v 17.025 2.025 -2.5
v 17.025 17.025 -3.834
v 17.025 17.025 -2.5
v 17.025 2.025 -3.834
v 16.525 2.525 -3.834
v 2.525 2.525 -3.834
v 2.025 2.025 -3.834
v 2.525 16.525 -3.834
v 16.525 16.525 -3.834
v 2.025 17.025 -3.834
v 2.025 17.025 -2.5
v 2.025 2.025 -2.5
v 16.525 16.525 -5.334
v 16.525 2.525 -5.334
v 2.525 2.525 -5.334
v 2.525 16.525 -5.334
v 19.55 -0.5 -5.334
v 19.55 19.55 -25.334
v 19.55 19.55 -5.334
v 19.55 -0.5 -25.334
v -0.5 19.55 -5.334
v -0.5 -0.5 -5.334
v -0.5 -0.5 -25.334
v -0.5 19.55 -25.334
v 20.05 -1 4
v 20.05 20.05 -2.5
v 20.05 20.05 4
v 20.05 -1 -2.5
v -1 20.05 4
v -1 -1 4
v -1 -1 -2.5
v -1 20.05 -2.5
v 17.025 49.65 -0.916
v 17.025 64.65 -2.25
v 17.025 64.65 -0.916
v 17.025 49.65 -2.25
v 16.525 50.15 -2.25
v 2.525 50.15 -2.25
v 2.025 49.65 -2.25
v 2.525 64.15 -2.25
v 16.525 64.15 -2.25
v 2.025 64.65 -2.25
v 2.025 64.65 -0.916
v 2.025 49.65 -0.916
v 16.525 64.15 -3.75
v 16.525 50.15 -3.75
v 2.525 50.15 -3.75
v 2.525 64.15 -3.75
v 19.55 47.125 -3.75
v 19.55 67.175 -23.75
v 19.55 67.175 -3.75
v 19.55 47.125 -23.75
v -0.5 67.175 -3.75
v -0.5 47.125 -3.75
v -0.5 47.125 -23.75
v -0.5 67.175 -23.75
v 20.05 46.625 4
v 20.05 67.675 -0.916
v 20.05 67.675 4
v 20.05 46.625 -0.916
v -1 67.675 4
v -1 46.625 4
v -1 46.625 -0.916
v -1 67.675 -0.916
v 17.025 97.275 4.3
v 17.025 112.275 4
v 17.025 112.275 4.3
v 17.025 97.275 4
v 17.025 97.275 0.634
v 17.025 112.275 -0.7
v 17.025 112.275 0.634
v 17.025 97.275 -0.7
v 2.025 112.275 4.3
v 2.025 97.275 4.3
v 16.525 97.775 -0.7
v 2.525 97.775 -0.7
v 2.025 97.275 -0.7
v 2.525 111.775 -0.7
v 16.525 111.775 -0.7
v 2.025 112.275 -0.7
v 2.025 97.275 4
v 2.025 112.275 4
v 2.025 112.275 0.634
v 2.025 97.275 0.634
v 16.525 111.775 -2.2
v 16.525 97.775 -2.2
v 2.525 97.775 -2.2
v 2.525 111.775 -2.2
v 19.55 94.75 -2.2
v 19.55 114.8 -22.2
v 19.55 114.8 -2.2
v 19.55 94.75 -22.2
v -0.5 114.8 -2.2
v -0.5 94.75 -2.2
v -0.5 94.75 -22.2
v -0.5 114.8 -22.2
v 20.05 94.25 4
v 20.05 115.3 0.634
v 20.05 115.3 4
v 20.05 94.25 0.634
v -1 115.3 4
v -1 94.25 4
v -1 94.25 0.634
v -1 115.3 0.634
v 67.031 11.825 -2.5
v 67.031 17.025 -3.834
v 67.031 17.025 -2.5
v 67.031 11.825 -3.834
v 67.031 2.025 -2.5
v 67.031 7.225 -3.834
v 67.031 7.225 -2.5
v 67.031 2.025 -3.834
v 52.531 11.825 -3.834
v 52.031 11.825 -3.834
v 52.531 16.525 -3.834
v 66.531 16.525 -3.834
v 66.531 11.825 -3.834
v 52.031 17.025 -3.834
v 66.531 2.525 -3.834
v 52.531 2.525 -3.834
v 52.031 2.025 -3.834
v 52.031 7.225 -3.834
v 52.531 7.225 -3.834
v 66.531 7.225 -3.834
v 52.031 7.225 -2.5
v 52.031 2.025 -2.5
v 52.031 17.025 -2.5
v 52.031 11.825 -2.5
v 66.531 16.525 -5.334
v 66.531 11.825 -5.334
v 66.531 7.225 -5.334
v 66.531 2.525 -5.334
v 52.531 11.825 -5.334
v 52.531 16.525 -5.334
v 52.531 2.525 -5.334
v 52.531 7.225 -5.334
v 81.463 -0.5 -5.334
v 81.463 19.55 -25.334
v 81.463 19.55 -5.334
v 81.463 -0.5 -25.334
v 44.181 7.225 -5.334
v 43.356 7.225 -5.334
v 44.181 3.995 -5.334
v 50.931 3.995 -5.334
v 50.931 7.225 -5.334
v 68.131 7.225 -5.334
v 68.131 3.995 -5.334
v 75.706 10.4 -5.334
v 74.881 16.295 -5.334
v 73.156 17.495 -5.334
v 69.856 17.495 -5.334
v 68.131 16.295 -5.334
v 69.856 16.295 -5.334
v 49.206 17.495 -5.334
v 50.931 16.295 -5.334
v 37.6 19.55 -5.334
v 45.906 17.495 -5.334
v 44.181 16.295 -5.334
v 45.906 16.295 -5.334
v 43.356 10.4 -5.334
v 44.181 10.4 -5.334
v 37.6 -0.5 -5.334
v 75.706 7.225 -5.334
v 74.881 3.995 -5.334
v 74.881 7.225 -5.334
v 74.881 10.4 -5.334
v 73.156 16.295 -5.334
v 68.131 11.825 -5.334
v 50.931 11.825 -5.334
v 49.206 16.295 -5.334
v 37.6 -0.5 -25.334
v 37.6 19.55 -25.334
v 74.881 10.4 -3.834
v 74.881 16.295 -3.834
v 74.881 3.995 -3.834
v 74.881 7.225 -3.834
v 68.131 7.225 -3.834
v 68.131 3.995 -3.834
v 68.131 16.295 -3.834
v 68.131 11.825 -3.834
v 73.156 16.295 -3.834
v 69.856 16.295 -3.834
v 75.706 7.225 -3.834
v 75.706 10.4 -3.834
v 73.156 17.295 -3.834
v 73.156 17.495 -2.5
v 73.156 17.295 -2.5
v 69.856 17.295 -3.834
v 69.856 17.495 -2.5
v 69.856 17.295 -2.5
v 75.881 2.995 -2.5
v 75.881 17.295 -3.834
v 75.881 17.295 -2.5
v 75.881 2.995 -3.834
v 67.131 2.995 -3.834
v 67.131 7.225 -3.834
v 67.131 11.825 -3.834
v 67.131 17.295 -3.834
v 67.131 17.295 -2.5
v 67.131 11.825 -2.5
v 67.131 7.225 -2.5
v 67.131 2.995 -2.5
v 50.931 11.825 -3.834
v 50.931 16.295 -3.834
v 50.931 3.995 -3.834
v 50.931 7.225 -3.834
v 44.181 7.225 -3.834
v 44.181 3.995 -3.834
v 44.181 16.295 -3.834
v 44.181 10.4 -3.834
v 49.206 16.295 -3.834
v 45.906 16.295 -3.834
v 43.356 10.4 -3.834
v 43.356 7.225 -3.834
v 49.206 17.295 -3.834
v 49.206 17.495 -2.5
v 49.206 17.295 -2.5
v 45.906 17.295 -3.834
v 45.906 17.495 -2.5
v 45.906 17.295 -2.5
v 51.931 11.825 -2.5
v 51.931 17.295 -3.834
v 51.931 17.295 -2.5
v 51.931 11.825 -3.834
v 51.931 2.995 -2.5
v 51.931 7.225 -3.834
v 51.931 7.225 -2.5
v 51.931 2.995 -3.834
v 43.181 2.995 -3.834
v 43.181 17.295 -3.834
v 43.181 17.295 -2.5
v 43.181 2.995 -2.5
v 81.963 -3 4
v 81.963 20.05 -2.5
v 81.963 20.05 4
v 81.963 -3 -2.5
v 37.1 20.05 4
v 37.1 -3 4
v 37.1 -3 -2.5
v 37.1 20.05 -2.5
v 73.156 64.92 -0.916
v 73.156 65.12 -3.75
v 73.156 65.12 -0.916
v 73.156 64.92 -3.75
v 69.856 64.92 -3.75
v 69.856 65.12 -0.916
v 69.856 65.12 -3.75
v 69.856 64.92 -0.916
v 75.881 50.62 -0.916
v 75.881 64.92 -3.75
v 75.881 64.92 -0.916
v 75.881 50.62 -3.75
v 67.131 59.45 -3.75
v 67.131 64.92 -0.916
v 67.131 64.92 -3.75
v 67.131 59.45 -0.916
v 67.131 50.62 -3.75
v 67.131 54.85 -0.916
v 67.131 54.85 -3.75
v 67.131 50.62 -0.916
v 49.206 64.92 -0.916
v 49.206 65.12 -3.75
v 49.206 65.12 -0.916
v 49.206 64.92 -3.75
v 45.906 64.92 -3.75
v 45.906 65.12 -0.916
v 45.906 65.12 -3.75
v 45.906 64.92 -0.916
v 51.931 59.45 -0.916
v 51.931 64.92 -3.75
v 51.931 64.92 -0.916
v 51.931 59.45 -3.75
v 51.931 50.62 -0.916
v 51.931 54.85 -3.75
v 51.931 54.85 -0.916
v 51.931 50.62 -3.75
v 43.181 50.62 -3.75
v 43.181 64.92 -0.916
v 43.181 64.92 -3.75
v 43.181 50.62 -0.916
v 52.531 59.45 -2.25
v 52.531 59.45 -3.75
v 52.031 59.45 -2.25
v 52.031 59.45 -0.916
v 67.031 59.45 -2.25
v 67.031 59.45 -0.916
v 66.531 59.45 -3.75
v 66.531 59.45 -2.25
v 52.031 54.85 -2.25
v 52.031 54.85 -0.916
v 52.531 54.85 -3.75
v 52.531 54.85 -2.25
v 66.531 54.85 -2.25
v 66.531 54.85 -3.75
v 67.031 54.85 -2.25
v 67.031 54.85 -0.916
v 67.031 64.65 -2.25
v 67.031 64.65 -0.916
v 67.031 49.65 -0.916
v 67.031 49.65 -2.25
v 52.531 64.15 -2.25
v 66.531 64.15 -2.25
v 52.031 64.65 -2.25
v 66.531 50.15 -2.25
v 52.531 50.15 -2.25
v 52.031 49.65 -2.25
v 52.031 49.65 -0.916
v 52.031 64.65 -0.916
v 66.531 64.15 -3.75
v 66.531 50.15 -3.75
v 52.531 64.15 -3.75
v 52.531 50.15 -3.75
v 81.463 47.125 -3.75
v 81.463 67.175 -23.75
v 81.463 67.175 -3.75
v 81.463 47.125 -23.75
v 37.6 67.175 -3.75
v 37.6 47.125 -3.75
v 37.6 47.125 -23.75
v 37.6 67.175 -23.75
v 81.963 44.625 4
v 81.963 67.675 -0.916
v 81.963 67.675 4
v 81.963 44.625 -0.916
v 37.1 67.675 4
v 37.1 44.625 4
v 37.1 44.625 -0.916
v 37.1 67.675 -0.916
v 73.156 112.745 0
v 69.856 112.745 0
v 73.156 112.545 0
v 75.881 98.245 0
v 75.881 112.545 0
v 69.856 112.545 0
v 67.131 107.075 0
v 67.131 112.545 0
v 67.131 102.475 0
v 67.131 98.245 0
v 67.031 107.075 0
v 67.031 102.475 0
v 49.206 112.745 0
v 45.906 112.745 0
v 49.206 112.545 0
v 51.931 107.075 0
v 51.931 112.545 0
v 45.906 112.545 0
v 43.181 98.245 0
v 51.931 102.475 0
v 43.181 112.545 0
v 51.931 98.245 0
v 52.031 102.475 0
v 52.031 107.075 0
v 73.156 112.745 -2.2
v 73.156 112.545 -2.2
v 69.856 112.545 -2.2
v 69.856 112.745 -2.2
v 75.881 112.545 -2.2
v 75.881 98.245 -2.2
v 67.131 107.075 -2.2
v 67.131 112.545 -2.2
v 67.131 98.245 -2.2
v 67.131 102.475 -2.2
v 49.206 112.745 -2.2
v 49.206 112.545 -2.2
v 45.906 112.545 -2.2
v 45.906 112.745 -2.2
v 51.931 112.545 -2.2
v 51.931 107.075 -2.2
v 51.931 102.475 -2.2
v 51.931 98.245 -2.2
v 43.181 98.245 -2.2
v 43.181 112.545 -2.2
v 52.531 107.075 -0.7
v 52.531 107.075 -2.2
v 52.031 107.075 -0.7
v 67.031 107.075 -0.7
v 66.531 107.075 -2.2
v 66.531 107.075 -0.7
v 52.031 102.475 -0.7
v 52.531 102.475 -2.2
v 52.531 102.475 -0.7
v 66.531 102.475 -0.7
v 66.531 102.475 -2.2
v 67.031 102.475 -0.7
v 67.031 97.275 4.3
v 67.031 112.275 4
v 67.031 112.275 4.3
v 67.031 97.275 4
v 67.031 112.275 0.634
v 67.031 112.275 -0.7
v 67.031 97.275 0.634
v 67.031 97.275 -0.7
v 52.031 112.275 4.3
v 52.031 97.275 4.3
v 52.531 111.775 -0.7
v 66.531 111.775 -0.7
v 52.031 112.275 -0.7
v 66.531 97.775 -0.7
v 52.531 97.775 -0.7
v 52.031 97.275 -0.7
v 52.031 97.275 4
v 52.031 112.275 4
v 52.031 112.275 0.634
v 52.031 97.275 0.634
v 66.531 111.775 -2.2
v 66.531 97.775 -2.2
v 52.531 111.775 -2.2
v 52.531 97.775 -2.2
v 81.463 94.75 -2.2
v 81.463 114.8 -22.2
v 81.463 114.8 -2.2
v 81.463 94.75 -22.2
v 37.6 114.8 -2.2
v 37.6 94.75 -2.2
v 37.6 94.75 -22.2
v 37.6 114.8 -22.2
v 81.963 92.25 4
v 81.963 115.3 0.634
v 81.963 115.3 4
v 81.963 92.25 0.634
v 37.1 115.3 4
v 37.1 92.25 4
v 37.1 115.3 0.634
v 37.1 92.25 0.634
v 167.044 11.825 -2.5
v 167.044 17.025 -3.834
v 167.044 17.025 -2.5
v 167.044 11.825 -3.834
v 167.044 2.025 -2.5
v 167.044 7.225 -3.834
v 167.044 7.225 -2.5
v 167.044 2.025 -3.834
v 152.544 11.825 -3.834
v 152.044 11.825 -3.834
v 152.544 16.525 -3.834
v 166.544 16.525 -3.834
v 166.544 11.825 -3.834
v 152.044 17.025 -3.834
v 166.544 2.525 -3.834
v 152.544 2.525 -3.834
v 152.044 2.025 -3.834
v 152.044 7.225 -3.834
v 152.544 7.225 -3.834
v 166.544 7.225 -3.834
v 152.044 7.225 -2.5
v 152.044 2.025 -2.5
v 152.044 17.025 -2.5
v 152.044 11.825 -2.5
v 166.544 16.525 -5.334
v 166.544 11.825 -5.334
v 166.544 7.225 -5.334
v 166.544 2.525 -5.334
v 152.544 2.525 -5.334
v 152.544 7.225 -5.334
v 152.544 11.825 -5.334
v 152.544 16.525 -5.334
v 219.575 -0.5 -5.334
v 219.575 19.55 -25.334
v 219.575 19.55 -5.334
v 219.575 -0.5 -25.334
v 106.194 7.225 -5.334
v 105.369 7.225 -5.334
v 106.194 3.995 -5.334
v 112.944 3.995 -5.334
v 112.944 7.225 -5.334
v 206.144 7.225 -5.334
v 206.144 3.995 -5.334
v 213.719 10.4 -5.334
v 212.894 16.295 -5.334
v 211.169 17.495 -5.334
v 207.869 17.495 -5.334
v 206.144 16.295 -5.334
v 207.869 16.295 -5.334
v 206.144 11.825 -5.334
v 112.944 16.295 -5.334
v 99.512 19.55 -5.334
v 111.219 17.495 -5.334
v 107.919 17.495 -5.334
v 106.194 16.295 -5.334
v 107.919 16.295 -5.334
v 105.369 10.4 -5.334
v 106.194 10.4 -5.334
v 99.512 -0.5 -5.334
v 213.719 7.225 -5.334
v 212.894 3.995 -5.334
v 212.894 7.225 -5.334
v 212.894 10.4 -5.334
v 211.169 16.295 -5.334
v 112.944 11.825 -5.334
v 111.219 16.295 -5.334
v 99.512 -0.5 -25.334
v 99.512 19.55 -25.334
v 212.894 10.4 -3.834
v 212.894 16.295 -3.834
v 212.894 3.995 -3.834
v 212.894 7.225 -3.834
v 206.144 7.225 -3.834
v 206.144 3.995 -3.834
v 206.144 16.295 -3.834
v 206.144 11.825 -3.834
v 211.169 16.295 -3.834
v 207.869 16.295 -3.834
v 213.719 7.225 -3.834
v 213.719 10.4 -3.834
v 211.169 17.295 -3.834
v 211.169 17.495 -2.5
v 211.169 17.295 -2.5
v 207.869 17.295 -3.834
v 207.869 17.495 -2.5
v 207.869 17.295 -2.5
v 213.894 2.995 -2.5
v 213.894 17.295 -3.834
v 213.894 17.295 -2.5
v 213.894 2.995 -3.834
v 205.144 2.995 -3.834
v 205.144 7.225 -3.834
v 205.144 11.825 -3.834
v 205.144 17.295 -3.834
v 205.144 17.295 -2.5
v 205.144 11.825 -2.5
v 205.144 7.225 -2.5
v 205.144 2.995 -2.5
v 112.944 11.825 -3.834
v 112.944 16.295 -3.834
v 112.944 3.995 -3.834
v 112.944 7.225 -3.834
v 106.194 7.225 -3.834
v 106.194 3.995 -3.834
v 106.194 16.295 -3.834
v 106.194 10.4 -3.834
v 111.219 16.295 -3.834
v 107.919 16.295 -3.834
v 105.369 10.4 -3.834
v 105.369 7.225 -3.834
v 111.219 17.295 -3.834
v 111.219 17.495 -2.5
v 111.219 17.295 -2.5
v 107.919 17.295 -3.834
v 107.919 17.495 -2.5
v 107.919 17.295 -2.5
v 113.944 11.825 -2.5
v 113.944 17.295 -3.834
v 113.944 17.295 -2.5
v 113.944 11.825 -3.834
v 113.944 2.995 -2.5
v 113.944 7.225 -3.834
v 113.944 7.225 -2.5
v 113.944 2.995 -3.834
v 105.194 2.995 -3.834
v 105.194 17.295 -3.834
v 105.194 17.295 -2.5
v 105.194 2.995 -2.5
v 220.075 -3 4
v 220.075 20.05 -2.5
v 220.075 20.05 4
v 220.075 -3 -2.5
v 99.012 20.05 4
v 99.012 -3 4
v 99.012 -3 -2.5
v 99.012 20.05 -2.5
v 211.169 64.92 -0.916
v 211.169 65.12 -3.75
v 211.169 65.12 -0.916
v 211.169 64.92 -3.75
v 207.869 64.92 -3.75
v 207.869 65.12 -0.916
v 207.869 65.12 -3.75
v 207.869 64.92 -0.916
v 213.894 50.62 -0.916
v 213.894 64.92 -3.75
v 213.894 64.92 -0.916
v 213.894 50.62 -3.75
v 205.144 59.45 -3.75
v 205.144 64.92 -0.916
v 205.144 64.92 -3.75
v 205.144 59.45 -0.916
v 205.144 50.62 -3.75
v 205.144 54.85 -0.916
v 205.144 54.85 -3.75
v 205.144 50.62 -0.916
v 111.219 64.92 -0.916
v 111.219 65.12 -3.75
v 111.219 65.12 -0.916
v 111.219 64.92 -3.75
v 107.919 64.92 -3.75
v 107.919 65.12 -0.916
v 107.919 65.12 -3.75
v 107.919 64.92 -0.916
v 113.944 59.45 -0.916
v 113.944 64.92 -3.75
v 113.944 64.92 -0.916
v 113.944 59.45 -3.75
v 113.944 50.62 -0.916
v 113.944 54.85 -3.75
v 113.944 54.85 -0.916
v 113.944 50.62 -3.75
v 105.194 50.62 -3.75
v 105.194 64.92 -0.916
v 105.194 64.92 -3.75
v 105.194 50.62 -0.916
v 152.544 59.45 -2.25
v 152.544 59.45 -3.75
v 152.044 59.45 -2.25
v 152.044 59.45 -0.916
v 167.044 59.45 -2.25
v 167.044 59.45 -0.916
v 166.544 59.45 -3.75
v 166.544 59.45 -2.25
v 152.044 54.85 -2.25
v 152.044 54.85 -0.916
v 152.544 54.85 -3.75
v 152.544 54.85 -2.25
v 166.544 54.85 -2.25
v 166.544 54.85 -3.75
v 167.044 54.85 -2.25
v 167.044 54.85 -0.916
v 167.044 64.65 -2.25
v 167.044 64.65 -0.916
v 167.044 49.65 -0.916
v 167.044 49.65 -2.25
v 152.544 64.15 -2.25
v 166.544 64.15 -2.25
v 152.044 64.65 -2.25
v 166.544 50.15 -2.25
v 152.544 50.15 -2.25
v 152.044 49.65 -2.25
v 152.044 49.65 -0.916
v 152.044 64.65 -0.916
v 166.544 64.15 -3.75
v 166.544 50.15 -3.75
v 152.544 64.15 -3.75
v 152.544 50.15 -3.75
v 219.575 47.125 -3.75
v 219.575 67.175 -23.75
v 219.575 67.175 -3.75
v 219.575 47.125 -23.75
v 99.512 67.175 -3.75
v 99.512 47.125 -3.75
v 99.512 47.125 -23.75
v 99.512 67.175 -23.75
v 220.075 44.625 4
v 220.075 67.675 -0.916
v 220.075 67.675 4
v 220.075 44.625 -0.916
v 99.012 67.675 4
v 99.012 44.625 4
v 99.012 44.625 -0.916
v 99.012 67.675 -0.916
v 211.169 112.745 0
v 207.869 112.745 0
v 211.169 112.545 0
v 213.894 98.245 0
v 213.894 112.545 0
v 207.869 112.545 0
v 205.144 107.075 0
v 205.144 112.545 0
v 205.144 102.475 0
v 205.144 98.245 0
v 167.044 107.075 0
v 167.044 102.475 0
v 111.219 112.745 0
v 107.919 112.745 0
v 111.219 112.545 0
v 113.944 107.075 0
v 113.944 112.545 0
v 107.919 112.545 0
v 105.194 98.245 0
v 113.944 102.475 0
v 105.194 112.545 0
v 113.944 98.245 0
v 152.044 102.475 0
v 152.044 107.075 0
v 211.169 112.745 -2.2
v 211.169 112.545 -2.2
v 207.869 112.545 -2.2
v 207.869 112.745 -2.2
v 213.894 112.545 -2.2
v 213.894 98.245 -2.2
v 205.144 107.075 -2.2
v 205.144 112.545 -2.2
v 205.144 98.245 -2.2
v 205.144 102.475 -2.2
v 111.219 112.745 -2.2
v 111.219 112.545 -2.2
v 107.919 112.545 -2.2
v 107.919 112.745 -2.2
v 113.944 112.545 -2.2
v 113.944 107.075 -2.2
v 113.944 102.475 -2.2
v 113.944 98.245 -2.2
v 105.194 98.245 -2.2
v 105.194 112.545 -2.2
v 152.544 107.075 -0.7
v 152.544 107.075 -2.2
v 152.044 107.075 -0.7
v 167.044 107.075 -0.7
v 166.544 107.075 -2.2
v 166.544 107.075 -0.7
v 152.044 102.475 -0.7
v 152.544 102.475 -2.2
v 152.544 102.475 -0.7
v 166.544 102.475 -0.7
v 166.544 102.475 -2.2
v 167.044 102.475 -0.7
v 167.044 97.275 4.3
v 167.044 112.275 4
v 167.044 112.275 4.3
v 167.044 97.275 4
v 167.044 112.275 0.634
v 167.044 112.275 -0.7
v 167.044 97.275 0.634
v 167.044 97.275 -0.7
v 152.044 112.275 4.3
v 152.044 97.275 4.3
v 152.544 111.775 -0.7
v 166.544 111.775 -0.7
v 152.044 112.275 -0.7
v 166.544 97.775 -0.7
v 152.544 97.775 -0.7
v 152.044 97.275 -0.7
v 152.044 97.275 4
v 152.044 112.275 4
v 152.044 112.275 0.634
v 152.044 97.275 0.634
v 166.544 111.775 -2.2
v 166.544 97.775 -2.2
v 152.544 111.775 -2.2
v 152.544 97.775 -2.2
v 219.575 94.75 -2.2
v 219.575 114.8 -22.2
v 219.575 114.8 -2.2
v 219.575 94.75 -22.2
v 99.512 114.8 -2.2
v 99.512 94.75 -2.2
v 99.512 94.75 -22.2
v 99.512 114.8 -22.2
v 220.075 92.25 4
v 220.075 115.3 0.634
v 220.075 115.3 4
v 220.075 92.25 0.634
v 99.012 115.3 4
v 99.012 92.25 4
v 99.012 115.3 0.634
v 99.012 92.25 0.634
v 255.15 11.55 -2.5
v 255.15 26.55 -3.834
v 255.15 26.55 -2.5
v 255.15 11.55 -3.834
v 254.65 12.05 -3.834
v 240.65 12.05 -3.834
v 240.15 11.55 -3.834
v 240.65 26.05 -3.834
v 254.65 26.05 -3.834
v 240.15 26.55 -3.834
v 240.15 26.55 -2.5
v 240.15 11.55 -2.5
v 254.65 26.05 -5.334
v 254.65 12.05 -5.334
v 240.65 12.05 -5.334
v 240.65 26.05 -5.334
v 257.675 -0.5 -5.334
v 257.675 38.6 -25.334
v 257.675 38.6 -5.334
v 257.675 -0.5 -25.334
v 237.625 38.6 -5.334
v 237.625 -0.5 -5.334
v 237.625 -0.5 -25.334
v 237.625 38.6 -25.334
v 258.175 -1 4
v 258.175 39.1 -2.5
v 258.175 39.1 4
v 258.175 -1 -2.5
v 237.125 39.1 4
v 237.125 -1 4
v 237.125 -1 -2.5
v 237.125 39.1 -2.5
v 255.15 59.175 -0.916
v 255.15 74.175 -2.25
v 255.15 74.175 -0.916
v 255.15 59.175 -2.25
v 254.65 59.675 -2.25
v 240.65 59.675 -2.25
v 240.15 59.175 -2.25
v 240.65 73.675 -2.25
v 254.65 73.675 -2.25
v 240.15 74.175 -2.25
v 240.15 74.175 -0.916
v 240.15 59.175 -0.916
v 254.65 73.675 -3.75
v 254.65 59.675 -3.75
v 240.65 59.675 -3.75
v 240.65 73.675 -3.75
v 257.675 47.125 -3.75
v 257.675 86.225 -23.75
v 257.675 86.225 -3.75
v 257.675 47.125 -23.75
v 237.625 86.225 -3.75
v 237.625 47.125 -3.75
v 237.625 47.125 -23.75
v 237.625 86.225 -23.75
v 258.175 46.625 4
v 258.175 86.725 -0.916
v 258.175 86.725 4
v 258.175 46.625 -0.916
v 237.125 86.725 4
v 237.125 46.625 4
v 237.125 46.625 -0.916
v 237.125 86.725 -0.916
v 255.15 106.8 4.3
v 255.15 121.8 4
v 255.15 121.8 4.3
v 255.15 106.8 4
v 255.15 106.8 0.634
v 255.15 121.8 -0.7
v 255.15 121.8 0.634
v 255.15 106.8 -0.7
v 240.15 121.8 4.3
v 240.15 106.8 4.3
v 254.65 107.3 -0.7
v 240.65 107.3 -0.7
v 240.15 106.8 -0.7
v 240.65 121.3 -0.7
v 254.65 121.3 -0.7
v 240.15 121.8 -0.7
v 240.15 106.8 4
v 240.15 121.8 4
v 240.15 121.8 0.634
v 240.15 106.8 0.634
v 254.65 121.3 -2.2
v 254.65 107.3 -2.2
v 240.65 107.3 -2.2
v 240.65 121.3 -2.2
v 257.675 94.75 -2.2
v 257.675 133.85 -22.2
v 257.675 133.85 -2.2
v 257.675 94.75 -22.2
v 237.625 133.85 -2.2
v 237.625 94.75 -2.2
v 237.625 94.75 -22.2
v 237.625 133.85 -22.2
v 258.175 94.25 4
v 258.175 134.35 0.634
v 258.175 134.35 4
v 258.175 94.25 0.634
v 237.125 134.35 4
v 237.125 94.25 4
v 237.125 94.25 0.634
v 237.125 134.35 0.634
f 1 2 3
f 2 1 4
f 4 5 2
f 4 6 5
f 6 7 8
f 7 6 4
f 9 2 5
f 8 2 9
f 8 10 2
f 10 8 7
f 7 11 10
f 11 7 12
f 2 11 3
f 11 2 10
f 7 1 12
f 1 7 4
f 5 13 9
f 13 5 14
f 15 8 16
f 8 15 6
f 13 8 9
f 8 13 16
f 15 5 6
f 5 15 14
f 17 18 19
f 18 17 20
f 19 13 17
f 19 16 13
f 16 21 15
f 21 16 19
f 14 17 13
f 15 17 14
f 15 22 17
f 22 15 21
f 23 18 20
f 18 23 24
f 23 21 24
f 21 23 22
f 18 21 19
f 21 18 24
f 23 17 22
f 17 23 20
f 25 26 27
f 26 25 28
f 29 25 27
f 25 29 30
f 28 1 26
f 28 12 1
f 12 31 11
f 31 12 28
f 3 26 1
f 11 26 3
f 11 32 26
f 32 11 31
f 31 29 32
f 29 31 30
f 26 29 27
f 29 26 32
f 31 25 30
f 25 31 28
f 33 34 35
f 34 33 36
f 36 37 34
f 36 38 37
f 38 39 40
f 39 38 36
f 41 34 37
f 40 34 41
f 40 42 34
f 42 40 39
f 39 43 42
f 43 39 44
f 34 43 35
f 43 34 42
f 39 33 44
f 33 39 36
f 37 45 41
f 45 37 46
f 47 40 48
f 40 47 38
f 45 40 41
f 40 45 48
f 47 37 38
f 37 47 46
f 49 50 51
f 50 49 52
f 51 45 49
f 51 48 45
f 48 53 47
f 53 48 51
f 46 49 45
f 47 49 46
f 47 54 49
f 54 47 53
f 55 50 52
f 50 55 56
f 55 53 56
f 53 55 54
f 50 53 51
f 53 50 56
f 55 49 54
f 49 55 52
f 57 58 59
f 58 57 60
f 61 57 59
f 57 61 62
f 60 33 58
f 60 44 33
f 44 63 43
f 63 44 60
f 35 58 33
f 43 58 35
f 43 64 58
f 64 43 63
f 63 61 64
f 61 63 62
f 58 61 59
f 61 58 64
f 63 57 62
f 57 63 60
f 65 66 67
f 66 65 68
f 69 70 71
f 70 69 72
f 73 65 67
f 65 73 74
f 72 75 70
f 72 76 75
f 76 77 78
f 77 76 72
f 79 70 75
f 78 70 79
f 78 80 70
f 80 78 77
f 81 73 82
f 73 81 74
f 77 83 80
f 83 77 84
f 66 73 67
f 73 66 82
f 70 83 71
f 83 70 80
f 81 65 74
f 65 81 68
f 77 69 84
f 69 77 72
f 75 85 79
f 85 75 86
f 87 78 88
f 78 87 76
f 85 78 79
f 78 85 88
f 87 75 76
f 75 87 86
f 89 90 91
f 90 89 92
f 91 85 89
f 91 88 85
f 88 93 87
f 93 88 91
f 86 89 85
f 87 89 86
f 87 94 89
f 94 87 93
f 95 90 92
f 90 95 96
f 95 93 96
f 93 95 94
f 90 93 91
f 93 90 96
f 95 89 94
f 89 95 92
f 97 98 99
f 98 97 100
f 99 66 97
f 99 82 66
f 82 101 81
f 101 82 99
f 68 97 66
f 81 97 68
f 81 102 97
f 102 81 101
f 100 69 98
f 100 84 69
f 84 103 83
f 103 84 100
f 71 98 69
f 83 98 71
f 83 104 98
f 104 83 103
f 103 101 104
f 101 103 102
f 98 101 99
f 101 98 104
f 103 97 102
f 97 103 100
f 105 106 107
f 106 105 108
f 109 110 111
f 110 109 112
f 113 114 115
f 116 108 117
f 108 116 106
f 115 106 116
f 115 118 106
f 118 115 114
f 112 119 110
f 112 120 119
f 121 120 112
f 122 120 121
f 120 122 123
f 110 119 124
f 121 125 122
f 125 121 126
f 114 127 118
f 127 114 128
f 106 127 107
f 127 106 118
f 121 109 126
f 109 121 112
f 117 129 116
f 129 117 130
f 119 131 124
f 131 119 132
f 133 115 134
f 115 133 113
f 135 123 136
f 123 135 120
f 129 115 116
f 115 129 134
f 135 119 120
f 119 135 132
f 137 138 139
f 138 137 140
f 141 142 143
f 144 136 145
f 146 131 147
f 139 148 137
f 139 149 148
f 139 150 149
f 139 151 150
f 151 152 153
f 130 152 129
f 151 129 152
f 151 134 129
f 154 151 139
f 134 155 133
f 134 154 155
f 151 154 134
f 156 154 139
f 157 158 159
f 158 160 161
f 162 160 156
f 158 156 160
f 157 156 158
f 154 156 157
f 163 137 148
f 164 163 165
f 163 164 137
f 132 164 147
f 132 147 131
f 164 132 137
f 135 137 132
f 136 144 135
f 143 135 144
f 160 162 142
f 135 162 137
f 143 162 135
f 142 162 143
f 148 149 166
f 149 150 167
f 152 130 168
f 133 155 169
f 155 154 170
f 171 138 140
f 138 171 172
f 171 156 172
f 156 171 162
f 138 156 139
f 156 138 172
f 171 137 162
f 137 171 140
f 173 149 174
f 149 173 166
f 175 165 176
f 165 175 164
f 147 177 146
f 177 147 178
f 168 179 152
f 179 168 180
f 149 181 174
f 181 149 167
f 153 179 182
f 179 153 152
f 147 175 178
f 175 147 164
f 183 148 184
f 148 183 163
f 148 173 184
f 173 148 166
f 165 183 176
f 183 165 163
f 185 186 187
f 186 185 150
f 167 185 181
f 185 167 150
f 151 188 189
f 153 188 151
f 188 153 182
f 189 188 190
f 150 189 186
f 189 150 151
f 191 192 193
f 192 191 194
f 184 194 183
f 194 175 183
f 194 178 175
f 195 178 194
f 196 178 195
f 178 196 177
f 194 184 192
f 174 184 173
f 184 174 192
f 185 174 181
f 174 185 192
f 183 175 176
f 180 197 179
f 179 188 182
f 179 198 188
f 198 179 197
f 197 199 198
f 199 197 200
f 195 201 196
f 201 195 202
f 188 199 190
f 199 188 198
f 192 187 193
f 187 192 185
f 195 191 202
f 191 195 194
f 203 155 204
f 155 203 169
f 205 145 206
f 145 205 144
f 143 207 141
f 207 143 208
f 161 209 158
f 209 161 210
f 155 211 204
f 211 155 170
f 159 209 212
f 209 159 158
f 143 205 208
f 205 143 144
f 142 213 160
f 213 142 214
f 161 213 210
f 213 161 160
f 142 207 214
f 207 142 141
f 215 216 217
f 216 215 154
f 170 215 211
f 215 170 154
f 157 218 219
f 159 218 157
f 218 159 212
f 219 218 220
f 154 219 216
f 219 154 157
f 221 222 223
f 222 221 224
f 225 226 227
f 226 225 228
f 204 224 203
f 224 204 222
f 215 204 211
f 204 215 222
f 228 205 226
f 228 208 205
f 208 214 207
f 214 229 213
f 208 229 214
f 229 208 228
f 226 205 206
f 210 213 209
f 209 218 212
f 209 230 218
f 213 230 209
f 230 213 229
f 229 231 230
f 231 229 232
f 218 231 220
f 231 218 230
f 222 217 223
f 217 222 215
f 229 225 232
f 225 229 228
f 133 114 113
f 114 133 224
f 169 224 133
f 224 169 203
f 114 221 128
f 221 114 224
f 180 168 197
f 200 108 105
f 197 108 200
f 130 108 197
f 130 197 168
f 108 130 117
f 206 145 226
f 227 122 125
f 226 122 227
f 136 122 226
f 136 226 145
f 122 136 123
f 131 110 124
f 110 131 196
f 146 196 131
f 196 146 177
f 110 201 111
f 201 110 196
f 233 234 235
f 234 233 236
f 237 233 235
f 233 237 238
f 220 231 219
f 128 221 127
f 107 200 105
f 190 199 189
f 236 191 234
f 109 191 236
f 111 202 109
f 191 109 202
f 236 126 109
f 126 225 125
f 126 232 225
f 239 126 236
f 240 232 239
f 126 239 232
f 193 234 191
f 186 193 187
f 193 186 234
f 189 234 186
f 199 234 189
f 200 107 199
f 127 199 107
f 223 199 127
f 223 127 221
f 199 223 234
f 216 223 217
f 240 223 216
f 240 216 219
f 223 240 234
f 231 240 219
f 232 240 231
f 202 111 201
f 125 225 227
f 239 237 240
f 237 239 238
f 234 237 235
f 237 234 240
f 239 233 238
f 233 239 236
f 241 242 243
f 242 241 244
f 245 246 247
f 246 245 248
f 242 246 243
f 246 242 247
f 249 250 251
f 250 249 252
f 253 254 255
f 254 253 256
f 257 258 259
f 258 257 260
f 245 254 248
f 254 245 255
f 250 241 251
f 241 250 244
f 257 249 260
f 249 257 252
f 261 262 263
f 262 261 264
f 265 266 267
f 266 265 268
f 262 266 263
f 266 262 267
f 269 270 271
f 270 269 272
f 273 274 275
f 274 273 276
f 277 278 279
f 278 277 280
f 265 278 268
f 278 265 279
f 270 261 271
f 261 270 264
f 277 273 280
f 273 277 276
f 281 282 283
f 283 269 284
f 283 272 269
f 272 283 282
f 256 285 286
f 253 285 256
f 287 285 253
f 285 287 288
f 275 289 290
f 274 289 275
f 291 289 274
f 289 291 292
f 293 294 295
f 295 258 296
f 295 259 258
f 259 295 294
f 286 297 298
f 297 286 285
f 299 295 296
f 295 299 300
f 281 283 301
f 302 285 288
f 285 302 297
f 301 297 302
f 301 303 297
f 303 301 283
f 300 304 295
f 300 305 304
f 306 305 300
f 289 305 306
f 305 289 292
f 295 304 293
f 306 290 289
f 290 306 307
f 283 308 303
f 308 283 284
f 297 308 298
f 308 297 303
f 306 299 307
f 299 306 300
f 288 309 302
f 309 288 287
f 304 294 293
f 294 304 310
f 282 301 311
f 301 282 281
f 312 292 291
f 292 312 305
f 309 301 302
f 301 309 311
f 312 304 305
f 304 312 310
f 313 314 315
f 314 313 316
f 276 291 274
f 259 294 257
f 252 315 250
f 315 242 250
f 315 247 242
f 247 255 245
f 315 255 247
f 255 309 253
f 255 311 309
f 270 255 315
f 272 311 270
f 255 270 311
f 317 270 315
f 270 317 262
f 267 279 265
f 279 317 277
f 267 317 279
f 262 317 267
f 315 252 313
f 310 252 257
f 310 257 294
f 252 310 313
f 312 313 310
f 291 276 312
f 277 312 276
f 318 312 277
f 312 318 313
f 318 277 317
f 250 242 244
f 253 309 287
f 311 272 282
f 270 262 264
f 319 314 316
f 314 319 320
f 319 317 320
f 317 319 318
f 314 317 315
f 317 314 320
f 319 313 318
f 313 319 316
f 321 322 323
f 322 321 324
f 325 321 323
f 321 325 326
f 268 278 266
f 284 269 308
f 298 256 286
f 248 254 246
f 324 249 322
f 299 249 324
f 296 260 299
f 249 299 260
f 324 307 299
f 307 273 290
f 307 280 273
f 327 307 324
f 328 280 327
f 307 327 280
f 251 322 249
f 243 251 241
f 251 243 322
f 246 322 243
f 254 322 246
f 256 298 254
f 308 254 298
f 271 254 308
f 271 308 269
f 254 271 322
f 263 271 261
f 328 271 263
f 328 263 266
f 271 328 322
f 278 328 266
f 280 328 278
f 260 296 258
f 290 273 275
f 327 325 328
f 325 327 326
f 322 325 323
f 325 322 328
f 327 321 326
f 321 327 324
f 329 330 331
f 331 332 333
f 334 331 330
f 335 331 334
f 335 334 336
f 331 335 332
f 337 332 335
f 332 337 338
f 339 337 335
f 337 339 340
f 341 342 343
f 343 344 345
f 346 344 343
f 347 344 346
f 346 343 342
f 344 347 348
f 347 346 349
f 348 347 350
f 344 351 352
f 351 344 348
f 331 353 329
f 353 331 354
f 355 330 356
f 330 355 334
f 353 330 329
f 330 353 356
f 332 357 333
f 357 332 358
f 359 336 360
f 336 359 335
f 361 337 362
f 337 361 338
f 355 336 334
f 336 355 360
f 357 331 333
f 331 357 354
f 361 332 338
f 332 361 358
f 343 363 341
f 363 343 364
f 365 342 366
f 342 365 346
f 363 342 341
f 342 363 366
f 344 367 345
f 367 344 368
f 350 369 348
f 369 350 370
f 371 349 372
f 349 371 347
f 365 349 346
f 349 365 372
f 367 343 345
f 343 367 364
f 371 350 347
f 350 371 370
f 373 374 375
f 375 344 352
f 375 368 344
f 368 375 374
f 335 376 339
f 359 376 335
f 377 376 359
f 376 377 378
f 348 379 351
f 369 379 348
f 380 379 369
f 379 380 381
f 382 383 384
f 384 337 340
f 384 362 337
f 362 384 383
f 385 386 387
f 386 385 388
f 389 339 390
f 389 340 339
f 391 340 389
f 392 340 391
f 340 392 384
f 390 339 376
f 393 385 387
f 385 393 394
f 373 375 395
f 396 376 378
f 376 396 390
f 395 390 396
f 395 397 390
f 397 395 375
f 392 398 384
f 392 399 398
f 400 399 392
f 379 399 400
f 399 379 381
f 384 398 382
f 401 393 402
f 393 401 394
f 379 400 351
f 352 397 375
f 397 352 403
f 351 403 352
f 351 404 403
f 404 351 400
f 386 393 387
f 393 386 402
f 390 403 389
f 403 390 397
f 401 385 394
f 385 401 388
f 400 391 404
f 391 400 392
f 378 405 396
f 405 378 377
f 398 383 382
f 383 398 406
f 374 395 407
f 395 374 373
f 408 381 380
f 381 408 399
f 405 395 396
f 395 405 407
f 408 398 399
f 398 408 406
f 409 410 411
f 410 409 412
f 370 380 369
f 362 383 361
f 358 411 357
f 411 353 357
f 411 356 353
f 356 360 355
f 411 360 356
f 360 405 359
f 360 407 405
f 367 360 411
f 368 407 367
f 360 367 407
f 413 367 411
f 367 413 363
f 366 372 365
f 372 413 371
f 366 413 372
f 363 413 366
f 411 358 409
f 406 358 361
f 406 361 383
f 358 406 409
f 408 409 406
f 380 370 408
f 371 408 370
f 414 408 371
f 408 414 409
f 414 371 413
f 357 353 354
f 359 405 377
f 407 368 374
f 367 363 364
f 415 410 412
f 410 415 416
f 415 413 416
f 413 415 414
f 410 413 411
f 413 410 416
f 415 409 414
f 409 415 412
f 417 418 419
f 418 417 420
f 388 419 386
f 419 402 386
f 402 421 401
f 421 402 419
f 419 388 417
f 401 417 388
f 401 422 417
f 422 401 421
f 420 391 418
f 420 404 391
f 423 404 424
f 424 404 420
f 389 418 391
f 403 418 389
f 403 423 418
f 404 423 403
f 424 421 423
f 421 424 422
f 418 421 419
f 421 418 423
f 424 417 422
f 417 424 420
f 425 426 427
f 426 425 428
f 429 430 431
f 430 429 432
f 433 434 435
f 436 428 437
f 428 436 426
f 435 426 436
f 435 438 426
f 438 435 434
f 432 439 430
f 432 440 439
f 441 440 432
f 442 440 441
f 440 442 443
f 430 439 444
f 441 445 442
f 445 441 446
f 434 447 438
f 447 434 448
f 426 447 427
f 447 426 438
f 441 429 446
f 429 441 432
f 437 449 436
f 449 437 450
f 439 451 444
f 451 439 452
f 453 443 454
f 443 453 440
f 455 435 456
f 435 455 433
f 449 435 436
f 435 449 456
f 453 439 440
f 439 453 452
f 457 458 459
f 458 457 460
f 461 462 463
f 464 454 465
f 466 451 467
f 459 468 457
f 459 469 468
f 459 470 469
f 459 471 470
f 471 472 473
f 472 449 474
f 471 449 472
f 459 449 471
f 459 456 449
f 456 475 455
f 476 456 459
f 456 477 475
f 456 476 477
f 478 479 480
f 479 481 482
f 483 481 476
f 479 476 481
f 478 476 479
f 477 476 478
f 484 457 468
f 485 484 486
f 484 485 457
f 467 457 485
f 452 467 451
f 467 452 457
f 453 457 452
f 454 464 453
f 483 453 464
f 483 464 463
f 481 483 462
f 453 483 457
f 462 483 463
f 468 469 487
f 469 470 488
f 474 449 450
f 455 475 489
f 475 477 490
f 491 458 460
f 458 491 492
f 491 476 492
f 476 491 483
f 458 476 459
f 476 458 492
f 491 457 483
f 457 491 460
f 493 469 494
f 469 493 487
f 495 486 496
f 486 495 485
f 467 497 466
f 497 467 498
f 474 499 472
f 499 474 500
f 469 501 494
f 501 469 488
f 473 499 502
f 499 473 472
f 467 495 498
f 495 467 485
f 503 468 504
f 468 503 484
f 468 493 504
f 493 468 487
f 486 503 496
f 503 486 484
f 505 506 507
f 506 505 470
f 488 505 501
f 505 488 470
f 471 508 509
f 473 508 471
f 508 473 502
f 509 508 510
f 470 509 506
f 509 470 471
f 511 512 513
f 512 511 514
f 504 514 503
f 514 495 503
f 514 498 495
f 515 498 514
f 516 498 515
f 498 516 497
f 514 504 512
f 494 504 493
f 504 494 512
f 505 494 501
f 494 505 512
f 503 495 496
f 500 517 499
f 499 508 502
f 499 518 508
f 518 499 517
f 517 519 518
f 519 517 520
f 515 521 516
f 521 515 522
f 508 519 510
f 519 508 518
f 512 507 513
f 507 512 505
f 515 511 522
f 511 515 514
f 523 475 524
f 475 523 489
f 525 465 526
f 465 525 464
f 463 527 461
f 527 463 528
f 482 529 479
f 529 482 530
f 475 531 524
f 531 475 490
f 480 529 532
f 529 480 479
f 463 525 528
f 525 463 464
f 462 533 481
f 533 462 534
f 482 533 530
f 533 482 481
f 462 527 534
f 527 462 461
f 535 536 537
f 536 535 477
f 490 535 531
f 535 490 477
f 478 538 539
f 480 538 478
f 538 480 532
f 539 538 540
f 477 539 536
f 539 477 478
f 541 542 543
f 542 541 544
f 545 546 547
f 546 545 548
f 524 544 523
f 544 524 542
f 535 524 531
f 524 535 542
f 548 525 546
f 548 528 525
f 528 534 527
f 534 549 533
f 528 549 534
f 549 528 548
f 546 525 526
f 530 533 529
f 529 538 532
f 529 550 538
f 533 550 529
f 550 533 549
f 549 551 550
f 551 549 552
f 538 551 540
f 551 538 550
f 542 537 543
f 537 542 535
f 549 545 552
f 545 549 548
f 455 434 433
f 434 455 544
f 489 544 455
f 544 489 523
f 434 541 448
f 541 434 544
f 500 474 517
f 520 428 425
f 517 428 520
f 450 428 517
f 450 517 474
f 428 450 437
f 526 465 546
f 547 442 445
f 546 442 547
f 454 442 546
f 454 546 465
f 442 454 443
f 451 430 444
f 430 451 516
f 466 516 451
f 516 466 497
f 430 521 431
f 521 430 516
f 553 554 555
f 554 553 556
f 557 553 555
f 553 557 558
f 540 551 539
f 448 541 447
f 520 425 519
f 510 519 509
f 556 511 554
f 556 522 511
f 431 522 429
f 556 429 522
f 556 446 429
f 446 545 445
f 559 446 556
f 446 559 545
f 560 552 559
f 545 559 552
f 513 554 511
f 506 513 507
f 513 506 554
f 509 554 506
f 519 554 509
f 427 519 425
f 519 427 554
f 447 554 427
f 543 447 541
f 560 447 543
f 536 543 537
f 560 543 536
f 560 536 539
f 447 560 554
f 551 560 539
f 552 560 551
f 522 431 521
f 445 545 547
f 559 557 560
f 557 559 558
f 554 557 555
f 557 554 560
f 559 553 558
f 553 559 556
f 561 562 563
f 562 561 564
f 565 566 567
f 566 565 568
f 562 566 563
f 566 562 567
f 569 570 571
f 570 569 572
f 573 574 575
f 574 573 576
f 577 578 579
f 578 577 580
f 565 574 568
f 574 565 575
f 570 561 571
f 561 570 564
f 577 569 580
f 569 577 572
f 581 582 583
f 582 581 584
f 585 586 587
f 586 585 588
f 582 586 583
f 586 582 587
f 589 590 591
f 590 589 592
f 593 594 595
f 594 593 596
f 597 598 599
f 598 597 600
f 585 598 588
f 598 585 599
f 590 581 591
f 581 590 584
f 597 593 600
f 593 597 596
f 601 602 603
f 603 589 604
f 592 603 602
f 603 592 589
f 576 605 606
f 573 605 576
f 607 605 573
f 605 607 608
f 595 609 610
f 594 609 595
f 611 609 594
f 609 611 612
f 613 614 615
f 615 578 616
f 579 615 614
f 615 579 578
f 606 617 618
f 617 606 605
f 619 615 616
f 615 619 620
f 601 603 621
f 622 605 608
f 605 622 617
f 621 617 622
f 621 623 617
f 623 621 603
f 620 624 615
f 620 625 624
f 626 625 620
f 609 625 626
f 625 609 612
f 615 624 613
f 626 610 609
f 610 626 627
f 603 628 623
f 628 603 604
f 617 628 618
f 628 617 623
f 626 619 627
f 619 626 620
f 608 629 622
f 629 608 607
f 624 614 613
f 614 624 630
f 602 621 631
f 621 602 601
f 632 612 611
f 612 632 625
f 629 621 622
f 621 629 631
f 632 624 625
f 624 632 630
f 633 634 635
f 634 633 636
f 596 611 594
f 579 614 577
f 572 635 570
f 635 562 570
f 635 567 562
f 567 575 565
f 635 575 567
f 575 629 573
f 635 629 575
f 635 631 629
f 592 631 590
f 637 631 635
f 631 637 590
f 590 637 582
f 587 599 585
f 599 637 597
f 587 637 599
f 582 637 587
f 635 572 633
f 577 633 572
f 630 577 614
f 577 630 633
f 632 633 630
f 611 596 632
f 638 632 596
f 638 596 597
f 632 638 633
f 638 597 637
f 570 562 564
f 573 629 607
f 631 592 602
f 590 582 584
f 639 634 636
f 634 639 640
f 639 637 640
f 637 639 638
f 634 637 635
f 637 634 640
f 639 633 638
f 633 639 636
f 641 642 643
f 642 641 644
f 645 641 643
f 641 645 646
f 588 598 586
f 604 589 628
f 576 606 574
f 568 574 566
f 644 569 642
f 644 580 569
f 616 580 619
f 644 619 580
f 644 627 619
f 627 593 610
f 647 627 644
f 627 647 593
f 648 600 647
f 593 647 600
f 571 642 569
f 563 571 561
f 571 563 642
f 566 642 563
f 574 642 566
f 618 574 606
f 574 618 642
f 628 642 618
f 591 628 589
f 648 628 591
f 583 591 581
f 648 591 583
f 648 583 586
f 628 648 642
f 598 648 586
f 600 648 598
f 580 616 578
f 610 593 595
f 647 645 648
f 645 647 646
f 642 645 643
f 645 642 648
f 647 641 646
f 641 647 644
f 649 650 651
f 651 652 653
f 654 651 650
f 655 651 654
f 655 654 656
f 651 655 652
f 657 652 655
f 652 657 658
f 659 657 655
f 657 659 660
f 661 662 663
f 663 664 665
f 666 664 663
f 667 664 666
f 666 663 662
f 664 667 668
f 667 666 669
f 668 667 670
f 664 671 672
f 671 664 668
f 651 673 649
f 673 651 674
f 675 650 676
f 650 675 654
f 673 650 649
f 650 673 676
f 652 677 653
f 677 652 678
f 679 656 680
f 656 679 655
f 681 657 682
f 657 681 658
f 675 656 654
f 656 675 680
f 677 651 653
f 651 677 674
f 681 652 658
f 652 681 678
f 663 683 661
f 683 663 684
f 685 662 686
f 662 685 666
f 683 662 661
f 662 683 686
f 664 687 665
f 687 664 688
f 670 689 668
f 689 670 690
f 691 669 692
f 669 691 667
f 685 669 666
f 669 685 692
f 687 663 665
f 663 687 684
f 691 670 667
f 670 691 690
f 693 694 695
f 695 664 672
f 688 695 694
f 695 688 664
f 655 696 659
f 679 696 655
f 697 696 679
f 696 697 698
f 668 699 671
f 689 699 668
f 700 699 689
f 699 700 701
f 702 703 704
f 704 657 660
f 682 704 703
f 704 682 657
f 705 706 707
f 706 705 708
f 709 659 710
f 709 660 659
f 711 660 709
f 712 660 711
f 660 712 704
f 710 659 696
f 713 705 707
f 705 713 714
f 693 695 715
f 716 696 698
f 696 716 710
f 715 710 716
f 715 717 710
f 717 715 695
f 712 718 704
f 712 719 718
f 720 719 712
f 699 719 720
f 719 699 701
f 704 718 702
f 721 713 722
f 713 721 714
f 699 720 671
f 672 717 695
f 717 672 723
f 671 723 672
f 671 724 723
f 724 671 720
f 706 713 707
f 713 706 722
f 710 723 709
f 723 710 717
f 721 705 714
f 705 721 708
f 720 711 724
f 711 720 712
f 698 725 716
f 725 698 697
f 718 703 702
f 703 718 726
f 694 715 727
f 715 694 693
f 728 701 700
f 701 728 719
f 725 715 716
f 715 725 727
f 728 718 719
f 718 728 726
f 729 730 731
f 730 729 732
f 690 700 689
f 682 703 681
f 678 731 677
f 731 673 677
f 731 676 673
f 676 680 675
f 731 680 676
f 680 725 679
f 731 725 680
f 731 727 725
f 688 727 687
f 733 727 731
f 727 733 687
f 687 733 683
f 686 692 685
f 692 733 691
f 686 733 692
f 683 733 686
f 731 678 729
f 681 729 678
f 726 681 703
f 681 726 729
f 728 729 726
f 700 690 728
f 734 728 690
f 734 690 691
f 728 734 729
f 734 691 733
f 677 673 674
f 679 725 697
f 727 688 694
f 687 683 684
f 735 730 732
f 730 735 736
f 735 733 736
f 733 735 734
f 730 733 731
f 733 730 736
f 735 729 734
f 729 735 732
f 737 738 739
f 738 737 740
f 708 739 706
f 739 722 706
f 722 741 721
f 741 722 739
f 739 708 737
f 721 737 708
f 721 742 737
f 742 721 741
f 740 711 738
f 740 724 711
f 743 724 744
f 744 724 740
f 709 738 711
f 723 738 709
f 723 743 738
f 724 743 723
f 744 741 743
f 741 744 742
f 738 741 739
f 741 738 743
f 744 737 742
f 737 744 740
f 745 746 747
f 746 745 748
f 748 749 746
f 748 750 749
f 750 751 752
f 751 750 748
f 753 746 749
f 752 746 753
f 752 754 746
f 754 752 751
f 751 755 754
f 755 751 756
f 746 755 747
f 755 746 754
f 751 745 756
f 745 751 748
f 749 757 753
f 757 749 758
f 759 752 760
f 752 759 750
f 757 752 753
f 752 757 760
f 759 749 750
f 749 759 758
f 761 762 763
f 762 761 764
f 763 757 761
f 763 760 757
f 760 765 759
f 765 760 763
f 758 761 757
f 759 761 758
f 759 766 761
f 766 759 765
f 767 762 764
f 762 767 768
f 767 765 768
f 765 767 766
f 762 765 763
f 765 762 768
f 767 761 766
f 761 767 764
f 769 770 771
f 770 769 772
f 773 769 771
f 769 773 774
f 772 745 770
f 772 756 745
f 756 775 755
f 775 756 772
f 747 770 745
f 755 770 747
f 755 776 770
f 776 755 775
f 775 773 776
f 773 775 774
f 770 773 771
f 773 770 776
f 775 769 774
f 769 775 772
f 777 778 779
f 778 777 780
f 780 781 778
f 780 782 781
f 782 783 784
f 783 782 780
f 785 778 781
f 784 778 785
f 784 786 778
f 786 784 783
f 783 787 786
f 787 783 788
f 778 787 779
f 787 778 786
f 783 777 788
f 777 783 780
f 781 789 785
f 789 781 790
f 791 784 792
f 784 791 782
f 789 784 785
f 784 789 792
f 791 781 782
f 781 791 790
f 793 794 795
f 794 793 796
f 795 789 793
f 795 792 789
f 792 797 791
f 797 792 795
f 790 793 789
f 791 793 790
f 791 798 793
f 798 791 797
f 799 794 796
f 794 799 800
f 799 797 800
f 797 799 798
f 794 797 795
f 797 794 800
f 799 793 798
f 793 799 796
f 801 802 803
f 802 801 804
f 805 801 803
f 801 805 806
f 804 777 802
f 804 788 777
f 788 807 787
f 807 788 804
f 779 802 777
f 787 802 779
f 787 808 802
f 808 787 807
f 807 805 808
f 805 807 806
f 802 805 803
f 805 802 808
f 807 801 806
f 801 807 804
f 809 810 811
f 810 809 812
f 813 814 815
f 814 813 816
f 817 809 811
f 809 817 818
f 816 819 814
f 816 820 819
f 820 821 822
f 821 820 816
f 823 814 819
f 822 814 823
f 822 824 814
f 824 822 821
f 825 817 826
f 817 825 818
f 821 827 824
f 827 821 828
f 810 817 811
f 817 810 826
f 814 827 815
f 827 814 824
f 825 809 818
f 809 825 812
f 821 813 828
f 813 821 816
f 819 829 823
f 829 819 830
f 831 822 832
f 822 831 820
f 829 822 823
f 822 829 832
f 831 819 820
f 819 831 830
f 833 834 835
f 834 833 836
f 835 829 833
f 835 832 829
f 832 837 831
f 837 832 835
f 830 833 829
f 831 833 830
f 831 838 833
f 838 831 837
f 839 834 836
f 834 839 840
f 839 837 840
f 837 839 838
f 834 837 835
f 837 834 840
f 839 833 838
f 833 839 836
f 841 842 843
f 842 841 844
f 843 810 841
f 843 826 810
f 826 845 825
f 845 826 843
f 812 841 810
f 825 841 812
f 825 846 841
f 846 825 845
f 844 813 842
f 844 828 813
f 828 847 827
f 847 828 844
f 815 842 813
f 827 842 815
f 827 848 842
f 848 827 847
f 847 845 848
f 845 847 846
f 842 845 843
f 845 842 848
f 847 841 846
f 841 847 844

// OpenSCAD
// file: ../../../lib/switches/stabilizers.scad
module stab_hole_render(distance){
  translate([14+distance+3.375,6.99,0]) {
    circle(d=3.175, $fn=40);
    translate([0,-15.24,0])
      circle(d=4.064, $fn=40);
  }
  translate([-6.75-distance+3.375,6.99,0]) {
    circle(d=3.175, $fn=40);
    translate([0,-15.24,0])
      circle(d=4.064, $fn=40);
  }
}

module stab_holes(width) {
  if (width >= 7) {
    stab_hole_render(39.6);
  } else if (width >= 6) {
    stab_hole_render(39.6);
  } else if(width >= 2) {
    stab_hole_render(1.6);
  }
}

module stab_render(distance, cnc=false, height=5.334) {
  translate([14+distance,1.47,0]){
    // Right Side Large Hole
    cube([6.75,12.3,10]);

    // Add 1/16" corner holes for milling
    if(cnc){
      translate([0.56,0.56,0])
        cylinder(h=10,d=1.59,$fn=20);
      translate([6.75-0.56,0.56,0])
        cylinder(h=10,d=1.59,$fn=20);
      translate([0.56,12.3-0.56,0])
        cylinder(h=10,d=1.59,$fn=20);
      translate([6.75-0.56,12.3-0.56,0])
        cylinder(h=10,d=1.59,$fn=20);
    }
    translate([5.75,3.23,0]){
      // Side hole for notch
      cube([1.825,3.175,10]);
      translate([1.825,1.59,0])
        if(cnc)
          resize([1.59,3.175,10])
            cylinder(h=10,d=1.59,$fn=20);
    }
    translate([1.725,11.3,0]){
      // Top Notch
      cube([3.3,2.2,10]);
      if(cnc)
        translate([1.65,2.2,0])
          resize([3.3,1,10])
            cylinder(h=10,d=1,$fn=20);
    }
    // Thin out for clip
    translate([-1,-1,10-height+1.5])
      cube([8.75,14.3,height-1.5]);
  }
  translate([-6.75-distance,1.47,0]){
    // Left Side Large Hole
    cube([6.75,12.3,10]);
    translate([-0.825,3.23,0]){
      // Side hole for notch
      cube([1.825,3.175,10]);
      if(cnc)
        translate([0,1.59,0])
          resize([1.59,3.175,10])
            cylinder(h=10,d=1.59,$fn=20);

    }
    translate([1.725,11.3,0]){
      // Top Notch
      cube([3.3,2.2,10]);
      if(cnc)
        translate([1.65,2.2,0])
          resize([3.3,1,10])
            cylinder(h=10,d=1,$fn=20);
    }
    if(cnc){
      translate([0.56,0.56,0])
        cylinder(h=10,d=1.59,$fn=20);
      translate([6.75-0.56,0.56,0])
        cylinder(h=10,d=1.59,$fn=20);
      translate([0.56,12.3-0.56,0])
        cylinder(h=10,d=1.59,$fn=20);
      translate([6.75-0.56,12.3-0.56,0])
        cylinder(h=10,d=1.59,$fn=20);
    }
    // Thin out for clip
    translate([-1,-1,10-height+1.5])
      cube([8.75,14.3,height-1.5]);
  }
  // Center shaft for bar
  translate([-distance-2,4.7,0]){
    cube([distance*2+20,4.6,10]);
  }
}

module stab(key_width, cnc=false) {
  if (key_width >= 7) {
    stab_render(39.6, cnc=cnc);
  } else if (key_width >= 6) {
    stab_render(39.6, cnc=cnc);
  } else if(key_width >= 2) {
    stab_render(1.6, cnc=cnc);
  }
}
// file: ../../../lib/variables.scad
key_size=19.05;
hole=14;

function u_mm(u) = u*key_size;
function hole_offset(u) = (key_size-hole)/2+u_mm(u-1)/2;

// This is used to determine how much space is between the top
// of the plate and the PCB.
function height_for_style(style) = style == "mx"        ? 5.334 :
                                   style == "redragon" ? 3.75  :
                                   style == "choc_v1"   ? 2.2   :  "invalid style";
// file: ../../../lib/utilities.scad
function reverse(list) = len(list) > 0 ? [for (i = [1:len(list)]) list[len(list)-i]] : [];
function pop(list) = len(list) > 0 ? [for (i = [0:len(list)-1]) if (i != 0) list[i]] : [];
// file: ../../../lib/switches/footprints.scad
include <../variables.scad>
include <stabilizers.scad>

module pcb_switch_outline(width=1, height=1) {
  stab_extra = width >= 2 ? 2 : 0;
  translate([0,-stab_extra])
    square([u_mm(width)+0.01, u_mm(height)+0.01+stab_extra]);
}

module pcb_switch_space_outline(width=1, height=1, style="mx", cnc=false) {
  offset = height_for_style(style);
  stab_extra = width >= 2 ? 2 : 0;
  translate([-1,-1-stab_extra,2.834-offset])
    cube([u_mm(width) + 2, u_mm(height) + 2 + stab_extra, 1.166+offset]);
  translate([u_mm(width/2),u_mm(height/2)]) {
    translate([-7.5,-7.5,1.5-offset])
      cube([15,15,5]);
    translate([-7,-7,-10])
      cube([14,14,10]);
    translate([u_mm(-width/2)-0.5,u_mm(-height/2)-0.5,-20-offset])
      cube([u_mm(width)+1,u_mm(height)+1, 20]);
  }
  translate([hole_offset(width), hole_offset(height),-10])
    stab(width);
}
// main file
include <../../../lib/switches/footprints.scad>
include <../../../lib/utilities.scad>

styles = ["mx", "redragon", "choc_v1"];
sizes = [[1,1],[2.25,1],[6.25,1],[1,2]];

module test(styles, sizes) {
  if(len(sizes) > 0) {
    for(style=[0:len(styles)-1]) {
      echo(style, " Style");
      translate([0,u_mm(style*2.5)])
        pcb_switch_space_outline(width=sizes[0][0], height=sizes[0][1], style=styles[style], cnc=false);
    }
    translate([u_mm(sizes[0][0]+1),0])
      test(styles, pop(sizes));
  }
}

test(styles, sizes);
